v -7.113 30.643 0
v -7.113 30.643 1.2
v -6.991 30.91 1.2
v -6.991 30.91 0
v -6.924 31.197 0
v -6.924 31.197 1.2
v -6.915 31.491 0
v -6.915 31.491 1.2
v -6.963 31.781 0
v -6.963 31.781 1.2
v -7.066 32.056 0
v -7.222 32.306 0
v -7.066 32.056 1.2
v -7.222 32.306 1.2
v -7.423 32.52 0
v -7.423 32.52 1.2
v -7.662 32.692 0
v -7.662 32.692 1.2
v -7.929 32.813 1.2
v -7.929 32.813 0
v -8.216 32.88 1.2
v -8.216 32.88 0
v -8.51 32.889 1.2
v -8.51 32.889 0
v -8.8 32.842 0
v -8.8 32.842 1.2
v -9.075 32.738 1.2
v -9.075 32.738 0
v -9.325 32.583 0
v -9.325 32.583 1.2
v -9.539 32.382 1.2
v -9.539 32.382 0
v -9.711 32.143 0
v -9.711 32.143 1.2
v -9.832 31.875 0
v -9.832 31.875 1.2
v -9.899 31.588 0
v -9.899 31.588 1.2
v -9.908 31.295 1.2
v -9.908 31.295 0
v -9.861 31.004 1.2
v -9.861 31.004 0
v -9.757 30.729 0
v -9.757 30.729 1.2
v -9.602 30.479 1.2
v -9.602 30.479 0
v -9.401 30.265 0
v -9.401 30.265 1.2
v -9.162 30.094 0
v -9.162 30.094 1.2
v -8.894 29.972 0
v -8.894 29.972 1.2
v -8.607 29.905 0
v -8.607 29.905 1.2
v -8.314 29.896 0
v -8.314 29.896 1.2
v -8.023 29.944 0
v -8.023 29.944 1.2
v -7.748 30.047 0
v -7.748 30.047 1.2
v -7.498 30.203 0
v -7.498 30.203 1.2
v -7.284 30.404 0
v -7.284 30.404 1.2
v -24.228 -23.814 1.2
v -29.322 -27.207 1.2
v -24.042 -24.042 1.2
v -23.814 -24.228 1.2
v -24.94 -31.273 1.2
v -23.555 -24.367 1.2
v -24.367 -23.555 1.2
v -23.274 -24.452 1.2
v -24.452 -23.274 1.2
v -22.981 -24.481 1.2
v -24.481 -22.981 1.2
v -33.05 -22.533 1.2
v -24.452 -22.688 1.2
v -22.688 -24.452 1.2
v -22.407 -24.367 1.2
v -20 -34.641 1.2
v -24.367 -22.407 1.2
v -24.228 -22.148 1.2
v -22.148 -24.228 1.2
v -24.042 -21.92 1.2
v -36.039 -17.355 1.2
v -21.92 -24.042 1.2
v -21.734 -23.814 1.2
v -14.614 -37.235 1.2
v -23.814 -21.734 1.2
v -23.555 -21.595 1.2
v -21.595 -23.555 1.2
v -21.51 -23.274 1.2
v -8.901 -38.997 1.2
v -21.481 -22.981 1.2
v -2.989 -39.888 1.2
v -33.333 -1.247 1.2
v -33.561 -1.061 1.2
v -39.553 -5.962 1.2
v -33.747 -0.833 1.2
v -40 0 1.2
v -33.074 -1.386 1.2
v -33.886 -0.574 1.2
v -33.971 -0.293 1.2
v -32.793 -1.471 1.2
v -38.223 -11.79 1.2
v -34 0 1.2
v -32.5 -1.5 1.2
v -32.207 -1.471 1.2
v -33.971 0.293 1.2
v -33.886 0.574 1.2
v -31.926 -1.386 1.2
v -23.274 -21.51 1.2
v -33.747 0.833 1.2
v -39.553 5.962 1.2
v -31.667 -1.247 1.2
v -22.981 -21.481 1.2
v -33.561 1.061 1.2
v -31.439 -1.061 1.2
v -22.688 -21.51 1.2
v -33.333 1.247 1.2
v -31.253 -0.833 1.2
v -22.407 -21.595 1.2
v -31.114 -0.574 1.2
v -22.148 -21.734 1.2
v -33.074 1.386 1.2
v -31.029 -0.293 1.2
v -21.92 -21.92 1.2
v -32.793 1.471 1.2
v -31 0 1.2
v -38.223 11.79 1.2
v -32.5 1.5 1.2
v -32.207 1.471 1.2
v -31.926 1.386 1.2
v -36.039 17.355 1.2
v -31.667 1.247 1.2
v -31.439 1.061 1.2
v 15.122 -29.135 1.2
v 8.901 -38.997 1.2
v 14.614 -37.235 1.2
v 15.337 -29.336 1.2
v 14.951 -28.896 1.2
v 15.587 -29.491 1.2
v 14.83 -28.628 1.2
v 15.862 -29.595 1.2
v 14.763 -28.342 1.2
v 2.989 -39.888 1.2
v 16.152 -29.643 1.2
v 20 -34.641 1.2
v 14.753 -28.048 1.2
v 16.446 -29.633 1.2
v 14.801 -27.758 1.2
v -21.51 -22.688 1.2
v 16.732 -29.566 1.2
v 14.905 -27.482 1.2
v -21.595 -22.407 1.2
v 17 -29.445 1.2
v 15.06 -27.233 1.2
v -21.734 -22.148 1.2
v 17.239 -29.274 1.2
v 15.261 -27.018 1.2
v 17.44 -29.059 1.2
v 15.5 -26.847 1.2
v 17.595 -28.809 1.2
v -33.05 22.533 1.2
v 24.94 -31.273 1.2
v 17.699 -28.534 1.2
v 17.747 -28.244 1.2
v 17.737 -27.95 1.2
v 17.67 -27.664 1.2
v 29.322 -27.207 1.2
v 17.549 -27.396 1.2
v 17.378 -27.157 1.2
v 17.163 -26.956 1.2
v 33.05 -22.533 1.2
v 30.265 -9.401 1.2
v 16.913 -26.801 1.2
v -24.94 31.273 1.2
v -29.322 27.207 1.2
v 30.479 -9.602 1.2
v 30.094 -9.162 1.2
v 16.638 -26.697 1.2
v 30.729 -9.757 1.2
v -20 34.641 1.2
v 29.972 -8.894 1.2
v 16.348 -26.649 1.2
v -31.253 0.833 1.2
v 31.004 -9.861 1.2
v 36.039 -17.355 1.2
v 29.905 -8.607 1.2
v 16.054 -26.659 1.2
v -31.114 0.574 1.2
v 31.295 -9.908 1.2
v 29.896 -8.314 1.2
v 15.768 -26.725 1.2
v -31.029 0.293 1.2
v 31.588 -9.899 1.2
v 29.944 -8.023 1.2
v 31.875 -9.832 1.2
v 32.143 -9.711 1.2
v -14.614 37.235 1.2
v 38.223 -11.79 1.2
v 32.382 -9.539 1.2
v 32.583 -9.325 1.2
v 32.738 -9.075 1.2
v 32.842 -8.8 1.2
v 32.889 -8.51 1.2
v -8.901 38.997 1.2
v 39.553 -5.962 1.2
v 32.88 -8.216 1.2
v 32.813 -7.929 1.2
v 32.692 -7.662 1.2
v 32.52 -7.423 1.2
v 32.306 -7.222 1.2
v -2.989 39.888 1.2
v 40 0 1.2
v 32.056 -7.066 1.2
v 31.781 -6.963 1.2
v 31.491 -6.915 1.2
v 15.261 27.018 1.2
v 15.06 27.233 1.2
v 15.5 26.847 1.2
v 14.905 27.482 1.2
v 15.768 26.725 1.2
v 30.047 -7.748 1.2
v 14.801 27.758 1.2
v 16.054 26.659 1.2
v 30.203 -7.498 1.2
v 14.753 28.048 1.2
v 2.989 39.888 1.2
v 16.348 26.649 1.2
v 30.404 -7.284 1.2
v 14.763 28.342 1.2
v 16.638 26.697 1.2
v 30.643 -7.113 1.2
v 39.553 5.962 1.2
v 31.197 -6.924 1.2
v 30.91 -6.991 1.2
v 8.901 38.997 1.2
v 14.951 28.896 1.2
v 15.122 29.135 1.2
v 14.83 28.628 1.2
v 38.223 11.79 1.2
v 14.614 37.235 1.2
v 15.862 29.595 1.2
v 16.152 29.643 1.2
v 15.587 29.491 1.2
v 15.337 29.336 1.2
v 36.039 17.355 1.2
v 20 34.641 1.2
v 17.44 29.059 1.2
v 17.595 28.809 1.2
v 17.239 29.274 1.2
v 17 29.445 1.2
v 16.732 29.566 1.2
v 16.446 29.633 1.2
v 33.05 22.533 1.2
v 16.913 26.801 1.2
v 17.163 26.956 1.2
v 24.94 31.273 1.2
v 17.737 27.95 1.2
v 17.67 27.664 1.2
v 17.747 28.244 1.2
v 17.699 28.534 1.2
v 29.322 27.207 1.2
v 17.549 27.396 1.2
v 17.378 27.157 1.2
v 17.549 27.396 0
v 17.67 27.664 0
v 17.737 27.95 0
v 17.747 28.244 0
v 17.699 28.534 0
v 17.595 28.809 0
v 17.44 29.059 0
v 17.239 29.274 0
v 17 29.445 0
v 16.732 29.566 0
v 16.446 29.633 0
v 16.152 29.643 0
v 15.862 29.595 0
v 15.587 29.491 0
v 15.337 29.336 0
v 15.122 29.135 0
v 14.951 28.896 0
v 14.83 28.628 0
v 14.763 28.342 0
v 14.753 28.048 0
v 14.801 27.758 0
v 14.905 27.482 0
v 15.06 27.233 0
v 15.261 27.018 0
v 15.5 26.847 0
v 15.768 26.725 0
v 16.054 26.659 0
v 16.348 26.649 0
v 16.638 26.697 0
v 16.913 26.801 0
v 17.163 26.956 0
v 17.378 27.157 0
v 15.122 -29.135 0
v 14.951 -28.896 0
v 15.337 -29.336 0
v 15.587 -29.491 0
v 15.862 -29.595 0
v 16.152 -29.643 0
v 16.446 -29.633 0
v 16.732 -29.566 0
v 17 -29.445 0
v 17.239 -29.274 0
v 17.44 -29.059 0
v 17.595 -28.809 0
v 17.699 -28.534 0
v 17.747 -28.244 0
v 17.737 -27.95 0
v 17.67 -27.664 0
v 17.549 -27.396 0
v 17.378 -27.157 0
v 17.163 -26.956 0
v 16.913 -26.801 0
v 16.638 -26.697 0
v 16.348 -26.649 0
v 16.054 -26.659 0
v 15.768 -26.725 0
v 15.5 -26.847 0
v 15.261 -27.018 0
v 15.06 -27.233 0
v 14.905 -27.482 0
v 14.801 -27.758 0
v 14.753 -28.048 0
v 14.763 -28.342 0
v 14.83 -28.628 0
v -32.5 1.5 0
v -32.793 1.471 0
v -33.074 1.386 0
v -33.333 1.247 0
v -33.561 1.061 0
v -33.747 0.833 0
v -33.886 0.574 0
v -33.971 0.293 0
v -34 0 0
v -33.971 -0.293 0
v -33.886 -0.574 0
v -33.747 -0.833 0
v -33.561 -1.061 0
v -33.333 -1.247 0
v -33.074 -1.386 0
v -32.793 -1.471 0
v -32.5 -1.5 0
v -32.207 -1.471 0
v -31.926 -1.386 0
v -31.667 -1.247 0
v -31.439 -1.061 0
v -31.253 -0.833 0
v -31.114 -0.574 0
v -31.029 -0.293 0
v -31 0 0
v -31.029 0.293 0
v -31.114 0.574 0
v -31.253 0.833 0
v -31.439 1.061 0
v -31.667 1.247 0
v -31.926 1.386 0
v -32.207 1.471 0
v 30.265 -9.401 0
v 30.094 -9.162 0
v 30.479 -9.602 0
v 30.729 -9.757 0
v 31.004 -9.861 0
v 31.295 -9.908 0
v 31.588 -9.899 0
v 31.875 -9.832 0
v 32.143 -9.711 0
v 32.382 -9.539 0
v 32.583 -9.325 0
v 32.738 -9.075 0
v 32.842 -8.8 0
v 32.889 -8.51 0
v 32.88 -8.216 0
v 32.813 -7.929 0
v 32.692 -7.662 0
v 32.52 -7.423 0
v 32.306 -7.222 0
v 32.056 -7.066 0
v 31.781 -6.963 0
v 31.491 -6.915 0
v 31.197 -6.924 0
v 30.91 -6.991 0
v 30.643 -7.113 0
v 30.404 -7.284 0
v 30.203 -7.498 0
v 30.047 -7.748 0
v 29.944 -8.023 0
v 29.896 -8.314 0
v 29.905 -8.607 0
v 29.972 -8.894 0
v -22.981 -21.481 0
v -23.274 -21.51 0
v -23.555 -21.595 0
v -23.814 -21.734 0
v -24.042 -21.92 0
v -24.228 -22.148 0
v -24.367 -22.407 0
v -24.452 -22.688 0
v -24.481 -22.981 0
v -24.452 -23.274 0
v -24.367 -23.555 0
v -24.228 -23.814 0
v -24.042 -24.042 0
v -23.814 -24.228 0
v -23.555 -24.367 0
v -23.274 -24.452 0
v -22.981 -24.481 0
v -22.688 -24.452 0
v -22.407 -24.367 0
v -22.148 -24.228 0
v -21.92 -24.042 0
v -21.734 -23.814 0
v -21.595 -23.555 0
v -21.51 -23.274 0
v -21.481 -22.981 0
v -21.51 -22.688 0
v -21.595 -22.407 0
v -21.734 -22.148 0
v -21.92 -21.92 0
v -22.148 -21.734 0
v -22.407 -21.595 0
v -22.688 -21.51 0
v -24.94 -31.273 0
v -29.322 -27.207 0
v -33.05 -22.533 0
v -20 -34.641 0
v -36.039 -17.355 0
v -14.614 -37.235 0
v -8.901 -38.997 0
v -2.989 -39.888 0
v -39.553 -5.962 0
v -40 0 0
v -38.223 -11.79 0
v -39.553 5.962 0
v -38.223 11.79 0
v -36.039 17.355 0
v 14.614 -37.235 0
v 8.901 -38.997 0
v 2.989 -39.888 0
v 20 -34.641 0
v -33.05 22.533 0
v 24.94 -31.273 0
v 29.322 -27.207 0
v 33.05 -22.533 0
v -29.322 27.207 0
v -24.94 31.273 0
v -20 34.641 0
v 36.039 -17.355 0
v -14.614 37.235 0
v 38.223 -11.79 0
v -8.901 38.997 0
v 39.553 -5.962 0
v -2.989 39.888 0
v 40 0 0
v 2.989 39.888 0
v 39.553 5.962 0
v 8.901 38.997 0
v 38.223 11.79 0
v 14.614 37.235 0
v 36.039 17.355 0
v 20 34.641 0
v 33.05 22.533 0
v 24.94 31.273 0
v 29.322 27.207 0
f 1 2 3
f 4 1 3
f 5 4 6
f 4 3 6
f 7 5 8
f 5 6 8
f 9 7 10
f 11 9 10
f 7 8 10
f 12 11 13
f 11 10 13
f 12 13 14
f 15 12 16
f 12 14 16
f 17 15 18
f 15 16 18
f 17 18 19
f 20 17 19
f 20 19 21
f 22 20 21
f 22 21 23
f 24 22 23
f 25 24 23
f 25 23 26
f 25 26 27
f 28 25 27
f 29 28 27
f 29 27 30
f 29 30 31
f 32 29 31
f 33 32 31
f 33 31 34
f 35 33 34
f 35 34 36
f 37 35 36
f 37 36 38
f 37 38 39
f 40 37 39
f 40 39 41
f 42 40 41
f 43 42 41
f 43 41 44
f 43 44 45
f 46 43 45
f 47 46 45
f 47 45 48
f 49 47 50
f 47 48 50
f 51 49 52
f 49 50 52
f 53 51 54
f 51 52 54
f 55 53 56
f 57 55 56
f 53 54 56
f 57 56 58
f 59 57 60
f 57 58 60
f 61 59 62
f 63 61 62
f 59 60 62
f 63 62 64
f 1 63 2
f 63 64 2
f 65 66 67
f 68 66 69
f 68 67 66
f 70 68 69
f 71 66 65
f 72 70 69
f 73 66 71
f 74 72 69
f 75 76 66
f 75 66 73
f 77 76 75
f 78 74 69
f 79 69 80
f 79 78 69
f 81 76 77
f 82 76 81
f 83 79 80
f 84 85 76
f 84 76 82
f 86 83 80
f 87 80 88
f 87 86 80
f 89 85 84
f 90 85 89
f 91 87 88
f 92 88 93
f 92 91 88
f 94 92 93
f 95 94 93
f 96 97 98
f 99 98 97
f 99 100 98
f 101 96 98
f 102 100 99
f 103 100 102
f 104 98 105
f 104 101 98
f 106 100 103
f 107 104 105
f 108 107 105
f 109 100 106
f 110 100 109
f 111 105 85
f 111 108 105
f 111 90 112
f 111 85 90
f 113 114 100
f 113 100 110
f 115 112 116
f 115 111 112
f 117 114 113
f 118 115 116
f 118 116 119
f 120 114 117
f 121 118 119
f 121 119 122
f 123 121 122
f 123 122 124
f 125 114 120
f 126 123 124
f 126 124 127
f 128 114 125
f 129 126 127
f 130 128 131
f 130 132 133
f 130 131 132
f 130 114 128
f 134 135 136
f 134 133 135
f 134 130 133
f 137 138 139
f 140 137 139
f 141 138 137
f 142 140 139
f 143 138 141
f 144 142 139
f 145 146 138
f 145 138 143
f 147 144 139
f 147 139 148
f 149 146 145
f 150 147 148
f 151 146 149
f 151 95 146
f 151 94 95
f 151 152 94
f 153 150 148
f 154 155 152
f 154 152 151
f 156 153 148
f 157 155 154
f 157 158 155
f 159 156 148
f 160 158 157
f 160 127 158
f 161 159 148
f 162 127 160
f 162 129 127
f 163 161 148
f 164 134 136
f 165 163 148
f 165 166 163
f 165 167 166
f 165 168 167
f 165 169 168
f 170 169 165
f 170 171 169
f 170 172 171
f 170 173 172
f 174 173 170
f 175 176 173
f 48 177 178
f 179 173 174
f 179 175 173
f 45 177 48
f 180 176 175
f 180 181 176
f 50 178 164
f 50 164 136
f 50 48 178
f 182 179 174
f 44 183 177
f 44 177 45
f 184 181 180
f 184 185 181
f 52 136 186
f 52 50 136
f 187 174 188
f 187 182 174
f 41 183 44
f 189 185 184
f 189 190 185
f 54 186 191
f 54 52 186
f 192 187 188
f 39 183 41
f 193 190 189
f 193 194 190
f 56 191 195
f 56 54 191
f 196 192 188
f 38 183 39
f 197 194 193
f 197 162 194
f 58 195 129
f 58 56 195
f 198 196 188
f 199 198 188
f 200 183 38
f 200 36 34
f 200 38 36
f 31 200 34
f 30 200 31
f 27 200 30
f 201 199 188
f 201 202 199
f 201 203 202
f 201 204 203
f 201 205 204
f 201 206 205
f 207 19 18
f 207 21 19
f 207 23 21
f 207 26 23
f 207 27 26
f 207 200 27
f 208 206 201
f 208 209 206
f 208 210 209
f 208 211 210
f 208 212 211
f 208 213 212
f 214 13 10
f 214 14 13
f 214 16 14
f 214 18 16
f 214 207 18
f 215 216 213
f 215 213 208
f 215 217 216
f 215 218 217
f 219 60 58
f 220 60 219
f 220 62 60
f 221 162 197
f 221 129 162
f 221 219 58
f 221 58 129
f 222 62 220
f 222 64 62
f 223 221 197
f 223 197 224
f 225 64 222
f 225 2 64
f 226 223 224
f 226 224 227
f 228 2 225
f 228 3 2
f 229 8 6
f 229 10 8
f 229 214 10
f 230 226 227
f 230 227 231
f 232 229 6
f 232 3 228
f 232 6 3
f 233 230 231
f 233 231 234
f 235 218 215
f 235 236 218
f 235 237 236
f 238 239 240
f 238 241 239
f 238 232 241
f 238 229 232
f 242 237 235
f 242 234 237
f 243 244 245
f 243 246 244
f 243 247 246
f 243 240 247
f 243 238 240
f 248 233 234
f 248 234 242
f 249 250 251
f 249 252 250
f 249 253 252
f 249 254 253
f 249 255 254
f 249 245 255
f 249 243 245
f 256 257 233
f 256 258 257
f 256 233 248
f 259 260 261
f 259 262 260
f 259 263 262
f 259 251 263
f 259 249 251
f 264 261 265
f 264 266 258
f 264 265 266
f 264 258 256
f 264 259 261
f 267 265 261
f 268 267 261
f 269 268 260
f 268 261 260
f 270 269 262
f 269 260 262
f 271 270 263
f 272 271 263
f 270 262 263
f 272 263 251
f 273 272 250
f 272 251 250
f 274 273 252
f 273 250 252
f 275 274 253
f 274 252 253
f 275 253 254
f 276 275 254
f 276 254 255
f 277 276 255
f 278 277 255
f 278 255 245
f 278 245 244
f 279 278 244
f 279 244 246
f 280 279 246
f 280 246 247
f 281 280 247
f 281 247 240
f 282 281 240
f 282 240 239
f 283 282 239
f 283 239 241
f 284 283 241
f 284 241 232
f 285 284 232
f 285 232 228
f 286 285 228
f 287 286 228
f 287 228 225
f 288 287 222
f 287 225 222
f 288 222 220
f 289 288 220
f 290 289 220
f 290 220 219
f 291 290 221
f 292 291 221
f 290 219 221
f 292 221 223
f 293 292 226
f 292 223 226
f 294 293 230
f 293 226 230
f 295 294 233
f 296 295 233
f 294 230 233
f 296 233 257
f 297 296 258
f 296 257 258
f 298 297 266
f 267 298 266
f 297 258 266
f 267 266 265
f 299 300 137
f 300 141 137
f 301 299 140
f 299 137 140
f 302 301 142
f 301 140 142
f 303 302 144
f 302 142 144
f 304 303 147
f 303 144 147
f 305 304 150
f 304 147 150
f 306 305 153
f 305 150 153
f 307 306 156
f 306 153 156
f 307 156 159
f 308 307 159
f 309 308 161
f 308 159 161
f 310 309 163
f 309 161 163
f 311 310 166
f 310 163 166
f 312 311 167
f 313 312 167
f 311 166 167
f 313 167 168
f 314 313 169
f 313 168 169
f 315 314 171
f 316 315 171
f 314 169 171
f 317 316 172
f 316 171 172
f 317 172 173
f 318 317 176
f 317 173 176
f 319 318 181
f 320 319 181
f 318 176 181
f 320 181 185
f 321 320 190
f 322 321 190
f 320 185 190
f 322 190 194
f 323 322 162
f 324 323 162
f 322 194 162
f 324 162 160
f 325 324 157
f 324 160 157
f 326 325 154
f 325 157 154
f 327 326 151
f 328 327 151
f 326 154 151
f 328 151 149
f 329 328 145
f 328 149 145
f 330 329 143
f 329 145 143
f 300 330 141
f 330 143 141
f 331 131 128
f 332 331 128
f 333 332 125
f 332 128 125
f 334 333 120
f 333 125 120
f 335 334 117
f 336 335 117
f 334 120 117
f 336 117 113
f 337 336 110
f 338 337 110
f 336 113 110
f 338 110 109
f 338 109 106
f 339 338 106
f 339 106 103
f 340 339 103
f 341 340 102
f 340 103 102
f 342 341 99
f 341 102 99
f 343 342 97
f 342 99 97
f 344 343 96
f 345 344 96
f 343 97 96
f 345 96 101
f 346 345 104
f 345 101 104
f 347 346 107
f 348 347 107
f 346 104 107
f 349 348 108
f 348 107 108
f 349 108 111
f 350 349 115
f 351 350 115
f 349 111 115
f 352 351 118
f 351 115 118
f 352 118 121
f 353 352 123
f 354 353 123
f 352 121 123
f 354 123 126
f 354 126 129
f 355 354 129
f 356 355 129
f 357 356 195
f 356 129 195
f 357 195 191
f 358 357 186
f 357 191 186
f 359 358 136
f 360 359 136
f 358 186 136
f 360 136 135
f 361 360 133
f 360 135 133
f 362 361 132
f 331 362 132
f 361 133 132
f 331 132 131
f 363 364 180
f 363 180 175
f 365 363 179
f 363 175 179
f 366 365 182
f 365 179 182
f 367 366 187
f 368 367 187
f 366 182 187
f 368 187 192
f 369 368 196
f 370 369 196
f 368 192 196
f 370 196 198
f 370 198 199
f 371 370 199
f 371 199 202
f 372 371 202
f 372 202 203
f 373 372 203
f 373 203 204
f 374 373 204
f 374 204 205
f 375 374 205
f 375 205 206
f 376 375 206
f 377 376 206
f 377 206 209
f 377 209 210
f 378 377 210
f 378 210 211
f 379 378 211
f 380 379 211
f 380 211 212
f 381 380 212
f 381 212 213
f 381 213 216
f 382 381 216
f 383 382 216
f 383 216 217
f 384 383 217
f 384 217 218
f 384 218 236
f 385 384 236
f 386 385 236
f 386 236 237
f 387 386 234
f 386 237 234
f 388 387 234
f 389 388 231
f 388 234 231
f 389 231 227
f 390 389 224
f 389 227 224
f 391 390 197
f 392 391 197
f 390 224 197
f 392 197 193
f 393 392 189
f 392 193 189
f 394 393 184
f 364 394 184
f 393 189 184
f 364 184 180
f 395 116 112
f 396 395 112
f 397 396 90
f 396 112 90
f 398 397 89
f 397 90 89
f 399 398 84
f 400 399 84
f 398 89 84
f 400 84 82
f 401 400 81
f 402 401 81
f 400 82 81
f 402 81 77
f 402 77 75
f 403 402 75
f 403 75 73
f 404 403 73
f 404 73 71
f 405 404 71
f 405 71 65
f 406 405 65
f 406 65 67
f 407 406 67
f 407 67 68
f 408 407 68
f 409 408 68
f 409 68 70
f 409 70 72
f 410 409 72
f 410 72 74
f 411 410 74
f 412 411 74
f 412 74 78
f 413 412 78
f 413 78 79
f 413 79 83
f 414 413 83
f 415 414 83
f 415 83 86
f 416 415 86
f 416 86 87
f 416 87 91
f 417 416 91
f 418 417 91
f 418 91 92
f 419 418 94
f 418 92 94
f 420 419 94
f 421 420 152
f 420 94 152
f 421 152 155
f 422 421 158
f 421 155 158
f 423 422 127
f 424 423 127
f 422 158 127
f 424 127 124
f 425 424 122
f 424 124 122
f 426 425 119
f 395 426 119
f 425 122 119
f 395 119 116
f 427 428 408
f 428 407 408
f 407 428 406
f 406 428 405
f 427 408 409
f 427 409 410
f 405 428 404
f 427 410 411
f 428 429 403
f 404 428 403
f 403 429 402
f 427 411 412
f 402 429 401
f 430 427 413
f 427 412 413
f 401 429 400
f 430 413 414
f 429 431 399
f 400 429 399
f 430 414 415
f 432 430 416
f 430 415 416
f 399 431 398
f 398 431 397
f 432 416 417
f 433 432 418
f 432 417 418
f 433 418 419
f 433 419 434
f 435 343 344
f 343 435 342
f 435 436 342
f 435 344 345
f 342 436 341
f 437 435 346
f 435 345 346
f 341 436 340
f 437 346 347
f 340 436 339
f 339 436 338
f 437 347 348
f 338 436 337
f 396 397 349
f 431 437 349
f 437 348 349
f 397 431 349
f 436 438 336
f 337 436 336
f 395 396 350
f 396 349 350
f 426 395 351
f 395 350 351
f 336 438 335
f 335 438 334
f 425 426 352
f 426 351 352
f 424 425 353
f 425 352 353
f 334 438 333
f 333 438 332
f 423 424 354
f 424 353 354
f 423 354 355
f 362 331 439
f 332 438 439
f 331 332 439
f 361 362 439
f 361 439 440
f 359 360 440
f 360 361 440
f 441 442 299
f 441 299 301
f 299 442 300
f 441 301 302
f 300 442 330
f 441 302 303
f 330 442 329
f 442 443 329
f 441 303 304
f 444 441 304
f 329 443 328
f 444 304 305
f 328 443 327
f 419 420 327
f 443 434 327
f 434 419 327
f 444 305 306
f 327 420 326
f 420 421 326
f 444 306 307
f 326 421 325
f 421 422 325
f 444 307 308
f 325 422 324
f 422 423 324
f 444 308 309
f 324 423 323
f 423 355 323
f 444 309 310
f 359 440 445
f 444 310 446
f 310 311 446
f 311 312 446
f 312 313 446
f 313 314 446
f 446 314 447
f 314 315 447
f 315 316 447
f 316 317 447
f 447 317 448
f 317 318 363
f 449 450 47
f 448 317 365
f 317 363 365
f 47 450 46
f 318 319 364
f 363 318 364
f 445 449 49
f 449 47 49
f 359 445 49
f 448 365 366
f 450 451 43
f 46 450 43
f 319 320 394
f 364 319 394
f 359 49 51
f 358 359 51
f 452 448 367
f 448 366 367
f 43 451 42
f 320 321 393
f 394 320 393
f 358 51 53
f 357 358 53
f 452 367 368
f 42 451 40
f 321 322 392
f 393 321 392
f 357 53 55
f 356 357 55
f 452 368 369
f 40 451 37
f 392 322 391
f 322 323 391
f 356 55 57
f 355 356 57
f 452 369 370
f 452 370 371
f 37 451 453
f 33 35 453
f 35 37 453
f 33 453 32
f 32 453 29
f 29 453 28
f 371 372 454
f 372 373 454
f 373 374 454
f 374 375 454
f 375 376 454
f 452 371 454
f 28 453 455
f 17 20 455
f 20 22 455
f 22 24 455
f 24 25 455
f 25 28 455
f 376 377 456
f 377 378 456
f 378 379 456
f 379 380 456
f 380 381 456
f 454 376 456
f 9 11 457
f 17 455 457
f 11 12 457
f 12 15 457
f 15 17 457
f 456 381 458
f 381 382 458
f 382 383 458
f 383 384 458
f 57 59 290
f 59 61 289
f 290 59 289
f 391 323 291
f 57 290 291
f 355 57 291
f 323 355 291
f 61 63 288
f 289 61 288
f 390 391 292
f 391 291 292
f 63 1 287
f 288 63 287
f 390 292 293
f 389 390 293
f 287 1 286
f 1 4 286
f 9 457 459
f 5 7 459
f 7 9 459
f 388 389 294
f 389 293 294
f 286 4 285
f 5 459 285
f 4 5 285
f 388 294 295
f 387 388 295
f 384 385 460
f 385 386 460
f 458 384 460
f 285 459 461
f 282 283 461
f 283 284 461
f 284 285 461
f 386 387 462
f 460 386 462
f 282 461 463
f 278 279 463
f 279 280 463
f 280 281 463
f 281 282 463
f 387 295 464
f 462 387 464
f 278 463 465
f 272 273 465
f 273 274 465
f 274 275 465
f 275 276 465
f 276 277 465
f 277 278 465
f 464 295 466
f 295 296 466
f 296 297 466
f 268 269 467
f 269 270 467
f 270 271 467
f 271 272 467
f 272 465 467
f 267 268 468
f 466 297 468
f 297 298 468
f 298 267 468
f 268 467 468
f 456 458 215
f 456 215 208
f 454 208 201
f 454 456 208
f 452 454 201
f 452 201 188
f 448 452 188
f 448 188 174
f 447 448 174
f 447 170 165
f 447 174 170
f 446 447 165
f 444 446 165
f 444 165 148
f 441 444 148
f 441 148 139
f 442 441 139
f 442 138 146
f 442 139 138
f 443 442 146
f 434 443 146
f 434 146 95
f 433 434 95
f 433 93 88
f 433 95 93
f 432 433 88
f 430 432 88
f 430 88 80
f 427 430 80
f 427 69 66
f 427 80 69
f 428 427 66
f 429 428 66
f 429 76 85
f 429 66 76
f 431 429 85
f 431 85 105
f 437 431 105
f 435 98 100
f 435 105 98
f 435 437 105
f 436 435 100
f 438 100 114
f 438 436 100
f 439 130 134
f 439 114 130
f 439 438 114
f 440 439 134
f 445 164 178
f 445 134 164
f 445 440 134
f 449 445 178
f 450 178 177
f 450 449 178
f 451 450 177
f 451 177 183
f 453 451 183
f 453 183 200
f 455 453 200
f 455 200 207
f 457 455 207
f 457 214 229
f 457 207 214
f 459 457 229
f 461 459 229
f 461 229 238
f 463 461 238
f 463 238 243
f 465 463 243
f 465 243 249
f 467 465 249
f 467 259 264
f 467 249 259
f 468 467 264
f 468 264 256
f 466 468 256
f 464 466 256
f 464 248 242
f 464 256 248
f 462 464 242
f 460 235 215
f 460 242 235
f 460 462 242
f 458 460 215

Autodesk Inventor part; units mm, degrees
ref_plane "YZ Plane" through (0, 0, 0) normal (1, 0, 0) x (0, 1, 0)
ref_plane "XZ Plane" through (0, 0, 0) normal (0, 1, 0) x (-1, 0, 0)
ref_plane "XY Plane" through (0, 0, 0) normal (0, 0, 1) x (1, 0, 0)
sketch "Sketch1" plane through (0, 0, 0) normal (0, 0, 1) x (1, 0, 0)
  circle A0 centre (0, 0) radius 40
  circle A1 centre (0, 0) radius 32.5
  line L0 (0, 0) -> (-26.7142, -26.7142)
  line L1 (0, 0) -> (37.7796, 0) construction
  point P0 (-32.5, 0)
  point P1 (-32.5, 0)
  point P2 (-22.981, -22.981)
  point P3 (-32.5, 0)
  dimension "d0" = 80
  dimension "d1" = 65
  dimension "d3" = 135
extrude "Extrusion1" add sketch "Sketch1" along normal blind 1.2 contours A0 | A1
hole "Hole1" at (-32.5, 0, 0) at (-22.981, -22.981, 0) direction (0, 0, 1) diameter 3 end through all
pattern_circular "Circular Pattern1" count 3 over 360 about axis through (0, 0, -10) along (0, 0, 1) of "Hole1"
properties part number "CNCM_STEEL_Bowl_Electromagnet_Plate" material "Steel"
